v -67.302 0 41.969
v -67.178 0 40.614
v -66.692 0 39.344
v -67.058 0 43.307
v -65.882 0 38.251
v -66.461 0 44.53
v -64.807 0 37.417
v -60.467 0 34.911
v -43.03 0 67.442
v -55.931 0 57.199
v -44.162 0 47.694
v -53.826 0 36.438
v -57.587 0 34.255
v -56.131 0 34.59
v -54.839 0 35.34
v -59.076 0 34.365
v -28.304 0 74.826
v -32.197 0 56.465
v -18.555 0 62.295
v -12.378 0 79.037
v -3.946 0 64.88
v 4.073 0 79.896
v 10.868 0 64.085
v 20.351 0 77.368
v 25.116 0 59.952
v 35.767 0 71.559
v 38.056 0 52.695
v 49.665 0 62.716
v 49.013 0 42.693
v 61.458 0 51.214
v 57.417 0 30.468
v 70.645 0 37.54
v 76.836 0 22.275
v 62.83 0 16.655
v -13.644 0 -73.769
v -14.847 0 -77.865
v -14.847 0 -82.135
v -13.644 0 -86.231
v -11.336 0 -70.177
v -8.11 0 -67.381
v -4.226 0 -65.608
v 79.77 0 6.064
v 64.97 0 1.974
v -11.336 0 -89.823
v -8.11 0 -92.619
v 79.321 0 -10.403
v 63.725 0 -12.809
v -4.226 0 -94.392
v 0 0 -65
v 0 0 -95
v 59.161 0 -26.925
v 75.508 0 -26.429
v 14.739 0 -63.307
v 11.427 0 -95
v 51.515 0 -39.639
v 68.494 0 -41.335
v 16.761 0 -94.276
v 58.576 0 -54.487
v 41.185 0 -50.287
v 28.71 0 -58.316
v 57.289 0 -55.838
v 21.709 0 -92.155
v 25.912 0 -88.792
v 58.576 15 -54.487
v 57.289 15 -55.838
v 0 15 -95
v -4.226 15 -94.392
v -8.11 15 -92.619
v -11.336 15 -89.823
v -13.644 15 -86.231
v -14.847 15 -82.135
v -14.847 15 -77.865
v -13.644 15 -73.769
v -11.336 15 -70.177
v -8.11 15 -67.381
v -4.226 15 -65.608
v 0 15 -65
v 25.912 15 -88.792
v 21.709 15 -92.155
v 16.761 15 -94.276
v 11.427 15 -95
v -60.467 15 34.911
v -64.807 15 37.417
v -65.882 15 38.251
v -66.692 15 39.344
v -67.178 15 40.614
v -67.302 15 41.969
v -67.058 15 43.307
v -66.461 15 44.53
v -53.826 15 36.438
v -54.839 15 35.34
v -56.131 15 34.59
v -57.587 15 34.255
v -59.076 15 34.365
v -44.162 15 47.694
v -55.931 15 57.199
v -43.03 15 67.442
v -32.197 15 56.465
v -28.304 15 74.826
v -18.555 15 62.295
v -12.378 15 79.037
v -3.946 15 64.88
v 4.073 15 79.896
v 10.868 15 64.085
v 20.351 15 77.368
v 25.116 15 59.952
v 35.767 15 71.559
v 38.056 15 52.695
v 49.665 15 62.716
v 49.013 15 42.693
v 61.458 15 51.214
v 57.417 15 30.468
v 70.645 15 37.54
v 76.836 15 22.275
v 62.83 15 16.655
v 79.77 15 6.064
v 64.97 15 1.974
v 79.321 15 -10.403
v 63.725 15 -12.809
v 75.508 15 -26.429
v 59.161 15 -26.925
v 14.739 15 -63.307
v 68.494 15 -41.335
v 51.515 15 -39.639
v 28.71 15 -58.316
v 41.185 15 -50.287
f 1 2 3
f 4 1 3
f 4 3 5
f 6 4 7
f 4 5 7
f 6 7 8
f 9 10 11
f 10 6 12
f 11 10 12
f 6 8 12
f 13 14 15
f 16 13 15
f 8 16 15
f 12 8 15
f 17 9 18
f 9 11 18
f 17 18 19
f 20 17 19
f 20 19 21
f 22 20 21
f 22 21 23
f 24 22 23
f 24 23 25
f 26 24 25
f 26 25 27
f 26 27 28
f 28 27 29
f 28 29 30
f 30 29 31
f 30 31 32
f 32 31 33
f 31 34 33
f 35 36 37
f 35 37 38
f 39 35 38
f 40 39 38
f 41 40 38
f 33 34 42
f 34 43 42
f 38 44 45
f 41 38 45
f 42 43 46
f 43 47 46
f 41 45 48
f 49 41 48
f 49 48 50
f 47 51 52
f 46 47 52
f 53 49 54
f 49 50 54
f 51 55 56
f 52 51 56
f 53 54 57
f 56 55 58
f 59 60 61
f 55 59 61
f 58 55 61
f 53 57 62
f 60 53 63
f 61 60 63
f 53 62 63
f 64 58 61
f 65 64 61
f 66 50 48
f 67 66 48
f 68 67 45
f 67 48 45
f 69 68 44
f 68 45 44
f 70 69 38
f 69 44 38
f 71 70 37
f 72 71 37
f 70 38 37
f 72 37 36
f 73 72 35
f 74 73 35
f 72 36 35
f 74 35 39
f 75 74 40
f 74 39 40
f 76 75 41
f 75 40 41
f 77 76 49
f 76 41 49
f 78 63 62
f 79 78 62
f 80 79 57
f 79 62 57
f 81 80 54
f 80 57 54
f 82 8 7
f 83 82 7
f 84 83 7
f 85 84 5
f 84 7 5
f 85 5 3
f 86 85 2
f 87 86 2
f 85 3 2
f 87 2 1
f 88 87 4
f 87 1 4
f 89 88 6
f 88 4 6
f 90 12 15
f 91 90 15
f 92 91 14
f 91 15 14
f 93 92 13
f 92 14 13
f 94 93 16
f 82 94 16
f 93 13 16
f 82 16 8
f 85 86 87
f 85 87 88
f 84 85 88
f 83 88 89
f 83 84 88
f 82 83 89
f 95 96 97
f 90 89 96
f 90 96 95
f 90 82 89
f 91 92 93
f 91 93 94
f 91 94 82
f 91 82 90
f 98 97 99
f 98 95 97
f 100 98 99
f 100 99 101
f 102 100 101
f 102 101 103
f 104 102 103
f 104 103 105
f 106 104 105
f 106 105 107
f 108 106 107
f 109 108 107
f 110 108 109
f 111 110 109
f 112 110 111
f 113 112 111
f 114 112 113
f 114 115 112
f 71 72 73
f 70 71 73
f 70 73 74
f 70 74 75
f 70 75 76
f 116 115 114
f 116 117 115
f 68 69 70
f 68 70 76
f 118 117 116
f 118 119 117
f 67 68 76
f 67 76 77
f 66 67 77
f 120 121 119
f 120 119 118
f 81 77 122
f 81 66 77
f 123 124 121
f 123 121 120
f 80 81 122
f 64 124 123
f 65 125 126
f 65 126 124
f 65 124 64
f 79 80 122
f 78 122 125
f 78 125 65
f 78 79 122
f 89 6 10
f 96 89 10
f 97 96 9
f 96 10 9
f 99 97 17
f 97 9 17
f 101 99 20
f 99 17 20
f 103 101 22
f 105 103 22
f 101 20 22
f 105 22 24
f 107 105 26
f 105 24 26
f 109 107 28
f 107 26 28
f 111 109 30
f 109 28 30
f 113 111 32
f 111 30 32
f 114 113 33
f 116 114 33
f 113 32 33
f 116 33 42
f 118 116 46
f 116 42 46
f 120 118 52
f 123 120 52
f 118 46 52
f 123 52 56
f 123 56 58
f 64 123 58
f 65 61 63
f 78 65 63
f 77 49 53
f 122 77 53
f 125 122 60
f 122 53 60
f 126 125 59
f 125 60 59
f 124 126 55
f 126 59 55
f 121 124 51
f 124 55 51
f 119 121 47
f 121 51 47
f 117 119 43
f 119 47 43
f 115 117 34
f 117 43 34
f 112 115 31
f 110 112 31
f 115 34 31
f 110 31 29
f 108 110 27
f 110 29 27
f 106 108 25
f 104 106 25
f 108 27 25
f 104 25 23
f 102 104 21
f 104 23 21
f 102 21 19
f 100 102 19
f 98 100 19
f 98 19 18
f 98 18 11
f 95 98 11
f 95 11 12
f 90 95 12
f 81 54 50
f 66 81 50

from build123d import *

# Parameters (mm, degrees)
EXTRUDE_4_DEPTH = 15


with BuildPart() as part:
    # ｽｹｯﾁ2 → ﾎﾞｽ - 押し出し4 (new body)
    with BuildSketch(Plane(origin=(0, 0, 0), x_dir=(1, 0, 0), z_dir=(0, 1, 0))):
        with BuildLine():
            ThreePointArc((-53.82643789, -36.437818048), (-56.846261527, -34.367935813), (-60.466933112, -34.910600109))
            Line((-60.466933112, -34.910600109), (-64.807406984, -37.416573868))
            ThreePointArc((-64.807406984, -37.416573868), (-67.177509772, -40.614402853), (-66.461234116, -44.529814279))
            ThreePointArc((-66.461234116, -44.529814279), (49.665387485, -62.716419588), (58.57572973, 54.487465409))
            Line((58.57572973, 54.487465409), (57.289371136, 55.838409315))
            Line((57.289371136, 55.838409315), (25.911523347, 88.791671712))
            ThreePointArc((25.911523347, 88.791671712), (19.306695871, 93.382511176), (11.427401304, 95))
            Line((11.427401304, 95), (0, 95))
            ThreePointArc((0, 95), (-15, 80), (0, 65))
            ThreePointArc((0, 65), (57.41714976, -30.467538684), (-53.82643789, -36.437818048))
        make_face()
    extrude(amount=EXTRUDE_4_DEPTH)


solid = part.part
